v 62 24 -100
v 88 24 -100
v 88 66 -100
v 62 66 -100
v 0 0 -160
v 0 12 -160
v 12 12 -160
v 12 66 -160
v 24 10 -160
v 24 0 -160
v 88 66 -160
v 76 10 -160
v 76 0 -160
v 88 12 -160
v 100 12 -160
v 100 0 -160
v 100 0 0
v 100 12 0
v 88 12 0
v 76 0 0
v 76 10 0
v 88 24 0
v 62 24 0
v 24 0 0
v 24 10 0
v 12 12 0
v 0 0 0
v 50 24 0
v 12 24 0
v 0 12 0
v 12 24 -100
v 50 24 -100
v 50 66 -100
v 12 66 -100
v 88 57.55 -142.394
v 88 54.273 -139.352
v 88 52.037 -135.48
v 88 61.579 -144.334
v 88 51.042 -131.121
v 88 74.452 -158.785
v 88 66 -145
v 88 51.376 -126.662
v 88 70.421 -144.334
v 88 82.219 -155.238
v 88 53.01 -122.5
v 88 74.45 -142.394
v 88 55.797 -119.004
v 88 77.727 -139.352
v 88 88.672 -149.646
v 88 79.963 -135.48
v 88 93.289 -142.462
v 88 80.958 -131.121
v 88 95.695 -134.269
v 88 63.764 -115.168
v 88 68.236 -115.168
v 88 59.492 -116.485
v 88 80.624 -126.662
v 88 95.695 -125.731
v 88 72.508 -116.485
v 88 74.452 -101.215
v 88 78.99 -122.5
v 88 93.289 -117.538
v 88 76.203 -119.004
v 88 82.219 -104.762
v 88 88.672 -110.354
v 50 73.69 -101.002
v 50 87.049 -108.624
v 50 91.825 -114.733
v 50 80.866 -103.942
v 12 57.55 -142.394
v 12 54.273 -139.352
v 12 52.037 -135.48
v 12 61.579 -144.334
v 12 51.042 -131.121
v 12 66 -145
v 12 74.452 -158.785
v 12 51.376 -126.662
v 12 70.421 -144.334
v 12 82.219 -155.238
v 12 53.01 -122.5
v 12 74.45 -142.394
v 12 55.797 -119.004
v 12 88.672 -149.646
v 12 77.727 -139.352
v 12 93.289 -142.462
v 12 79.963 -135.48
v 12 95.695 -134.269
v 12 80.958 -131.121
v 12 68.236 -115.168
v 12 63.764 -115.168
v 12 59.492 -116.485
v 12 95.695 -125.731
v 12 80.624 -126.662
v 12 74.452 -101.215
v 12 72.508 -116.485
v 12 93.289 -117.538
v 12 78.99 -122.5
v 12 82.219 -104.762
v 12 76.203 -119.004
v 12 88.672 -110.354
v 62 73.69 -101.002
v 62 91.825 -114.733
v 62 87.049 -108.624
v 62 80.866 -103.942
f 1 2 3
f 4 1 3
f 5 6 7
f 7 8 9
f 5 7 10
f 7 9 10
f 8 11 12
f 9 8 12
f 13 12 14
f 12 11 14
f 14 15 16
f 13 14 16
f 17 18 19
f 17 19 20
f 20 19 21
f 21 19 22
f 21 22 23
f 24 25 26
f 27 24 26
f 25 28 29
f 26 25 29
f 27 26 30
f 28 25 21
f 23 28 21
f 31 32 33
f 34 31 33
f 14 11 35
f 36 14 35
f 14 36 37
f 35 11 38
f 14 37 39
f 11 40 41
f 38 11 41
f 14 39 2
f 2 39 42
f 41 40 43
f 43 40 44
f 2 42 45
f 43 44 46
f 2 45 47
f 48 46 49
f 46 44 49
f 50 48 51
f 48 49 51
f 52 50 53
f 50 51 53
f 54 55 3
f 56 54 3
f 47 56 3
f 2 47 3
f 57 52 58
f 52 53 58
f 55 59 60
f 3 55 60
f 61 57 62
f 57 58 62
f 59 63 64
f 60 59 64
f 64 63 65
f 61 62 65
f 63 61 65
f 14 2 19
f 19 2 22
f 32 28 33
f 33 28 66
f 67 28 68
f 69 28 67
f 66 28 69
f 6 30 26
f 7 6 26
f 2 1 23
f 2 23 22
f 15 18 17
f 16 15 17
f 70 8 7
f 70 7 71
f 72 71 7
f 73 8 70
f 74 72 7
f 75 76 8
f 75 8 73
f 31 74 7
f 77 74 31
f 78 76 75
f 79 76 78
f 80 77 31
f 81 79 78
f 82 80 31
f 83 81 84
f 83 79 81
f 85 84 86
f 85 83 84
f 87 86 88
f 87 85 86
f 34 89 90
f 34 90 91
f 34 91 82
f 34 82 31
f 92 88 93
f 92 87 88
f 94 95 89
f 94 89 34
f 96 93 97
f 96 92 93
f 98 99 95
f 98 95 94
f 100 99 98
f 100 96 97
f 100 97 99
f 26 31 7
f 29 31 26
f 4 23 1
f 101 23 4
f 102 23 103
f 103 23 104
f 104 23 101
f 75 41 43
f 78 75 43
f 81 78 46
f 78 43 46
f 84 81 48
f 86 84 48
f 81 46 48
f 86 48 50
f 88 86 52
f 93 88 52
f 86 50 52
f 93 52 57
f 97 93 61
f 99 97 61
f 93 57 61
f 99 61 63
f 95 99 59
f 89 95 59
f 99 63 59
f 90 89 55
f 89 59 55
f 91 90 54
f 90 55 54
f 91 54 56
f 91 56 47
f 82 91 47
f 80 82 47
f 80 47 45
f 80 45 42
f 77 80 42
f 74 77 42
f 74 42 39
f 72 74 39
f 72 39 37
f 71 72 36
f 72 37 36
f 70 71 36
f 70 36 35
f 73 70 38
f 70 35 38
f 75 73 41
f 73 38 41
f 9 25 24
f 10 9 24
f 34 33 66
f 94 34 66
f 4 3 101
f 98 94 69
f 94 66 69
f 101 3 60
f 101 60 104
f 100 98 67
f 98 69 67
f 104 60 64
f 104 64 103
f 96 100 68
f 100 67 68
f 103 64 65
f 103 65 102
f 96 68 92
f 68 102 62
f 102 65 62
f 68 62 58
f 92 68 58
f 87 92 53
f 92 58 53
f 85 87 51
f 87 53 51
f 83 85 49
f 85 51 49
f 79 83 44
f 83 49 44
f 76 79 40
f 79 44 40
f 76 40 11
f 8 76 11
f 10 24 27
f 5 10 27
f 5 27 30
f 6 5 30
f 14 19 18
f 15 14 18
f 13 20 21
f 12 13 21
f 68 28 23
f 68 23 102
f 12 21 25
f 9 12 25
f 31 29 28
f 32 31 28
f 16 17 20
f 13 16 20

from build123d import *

# Parameters (mm, degrees)
BOSS_EXTRUDE1_DEPTH = 160
SKETCH3_R           = 15
BOSS_EXTRUDE3_DEPTH = 76
RIB2_REACH          = 196.813
SKETCH5_WALL_W      = 524.907117832
SKETCH5_WALL_H      = 12


with BuildPart() as part:
    # Sketch2 → Boss-Extrude1 (new body)
    with BuildSketch(Plane.XY):
        Polygon((0, 0), (0, 12), (12, 12), (12, 24), (88, 24), (88, 12), (100, 12), (100, 0), (76, 0), (76, 10), (24, 10), (24, 0), align=None)
    extrude(amount=-BOSS_EXTRUDE1_DEPTH)

    # Sketch3 → Boss-Extrude3 (add)
    with BuildSketch(Plane(origin=(88, 0, 0), x_dir=(0, 0, -1), z_dir=(1, 0, 0))):
        with BuildLine():
            Line((100, 24), (100, 66))
            ThreePointArc((100, 66), (130, 96), (160, 66))
            Line((160, 66), (160, 24))
            Line((160, 24), (100, 24))
        make_face()
        with Locations((130, 66)):
            Circle(SKETCH3_R, mode=Mode.SUBTRACT)
    extrude(amount=-BOSS_EXTRUDE3_DEPTH)

    # Sketch5 wall → Rib2 (add, up to next)
    with BuildSketch(Plane(origin=(56, 57.912517706, -57.366725049), x_dir=(0, 0.508884996756, -0.860834513758), z_dir=(0, 0.860834513758, 0.508884996756)), mode=Mode.PRIVATE) as rib2_sk1:
        Rectangle(SKETCH5_WALL_W, SKETCH5_WALL_H)
    rib2_tool1 = extrude(rib2_sk1.sketch, amount=-RIB2_REACH, mode=Mode.PRIVATE) - part.part
    add(rib2_tool1.solids().sort_by_distance((56, 57.912517706, -57.366725049))[0])


solid = part.part
